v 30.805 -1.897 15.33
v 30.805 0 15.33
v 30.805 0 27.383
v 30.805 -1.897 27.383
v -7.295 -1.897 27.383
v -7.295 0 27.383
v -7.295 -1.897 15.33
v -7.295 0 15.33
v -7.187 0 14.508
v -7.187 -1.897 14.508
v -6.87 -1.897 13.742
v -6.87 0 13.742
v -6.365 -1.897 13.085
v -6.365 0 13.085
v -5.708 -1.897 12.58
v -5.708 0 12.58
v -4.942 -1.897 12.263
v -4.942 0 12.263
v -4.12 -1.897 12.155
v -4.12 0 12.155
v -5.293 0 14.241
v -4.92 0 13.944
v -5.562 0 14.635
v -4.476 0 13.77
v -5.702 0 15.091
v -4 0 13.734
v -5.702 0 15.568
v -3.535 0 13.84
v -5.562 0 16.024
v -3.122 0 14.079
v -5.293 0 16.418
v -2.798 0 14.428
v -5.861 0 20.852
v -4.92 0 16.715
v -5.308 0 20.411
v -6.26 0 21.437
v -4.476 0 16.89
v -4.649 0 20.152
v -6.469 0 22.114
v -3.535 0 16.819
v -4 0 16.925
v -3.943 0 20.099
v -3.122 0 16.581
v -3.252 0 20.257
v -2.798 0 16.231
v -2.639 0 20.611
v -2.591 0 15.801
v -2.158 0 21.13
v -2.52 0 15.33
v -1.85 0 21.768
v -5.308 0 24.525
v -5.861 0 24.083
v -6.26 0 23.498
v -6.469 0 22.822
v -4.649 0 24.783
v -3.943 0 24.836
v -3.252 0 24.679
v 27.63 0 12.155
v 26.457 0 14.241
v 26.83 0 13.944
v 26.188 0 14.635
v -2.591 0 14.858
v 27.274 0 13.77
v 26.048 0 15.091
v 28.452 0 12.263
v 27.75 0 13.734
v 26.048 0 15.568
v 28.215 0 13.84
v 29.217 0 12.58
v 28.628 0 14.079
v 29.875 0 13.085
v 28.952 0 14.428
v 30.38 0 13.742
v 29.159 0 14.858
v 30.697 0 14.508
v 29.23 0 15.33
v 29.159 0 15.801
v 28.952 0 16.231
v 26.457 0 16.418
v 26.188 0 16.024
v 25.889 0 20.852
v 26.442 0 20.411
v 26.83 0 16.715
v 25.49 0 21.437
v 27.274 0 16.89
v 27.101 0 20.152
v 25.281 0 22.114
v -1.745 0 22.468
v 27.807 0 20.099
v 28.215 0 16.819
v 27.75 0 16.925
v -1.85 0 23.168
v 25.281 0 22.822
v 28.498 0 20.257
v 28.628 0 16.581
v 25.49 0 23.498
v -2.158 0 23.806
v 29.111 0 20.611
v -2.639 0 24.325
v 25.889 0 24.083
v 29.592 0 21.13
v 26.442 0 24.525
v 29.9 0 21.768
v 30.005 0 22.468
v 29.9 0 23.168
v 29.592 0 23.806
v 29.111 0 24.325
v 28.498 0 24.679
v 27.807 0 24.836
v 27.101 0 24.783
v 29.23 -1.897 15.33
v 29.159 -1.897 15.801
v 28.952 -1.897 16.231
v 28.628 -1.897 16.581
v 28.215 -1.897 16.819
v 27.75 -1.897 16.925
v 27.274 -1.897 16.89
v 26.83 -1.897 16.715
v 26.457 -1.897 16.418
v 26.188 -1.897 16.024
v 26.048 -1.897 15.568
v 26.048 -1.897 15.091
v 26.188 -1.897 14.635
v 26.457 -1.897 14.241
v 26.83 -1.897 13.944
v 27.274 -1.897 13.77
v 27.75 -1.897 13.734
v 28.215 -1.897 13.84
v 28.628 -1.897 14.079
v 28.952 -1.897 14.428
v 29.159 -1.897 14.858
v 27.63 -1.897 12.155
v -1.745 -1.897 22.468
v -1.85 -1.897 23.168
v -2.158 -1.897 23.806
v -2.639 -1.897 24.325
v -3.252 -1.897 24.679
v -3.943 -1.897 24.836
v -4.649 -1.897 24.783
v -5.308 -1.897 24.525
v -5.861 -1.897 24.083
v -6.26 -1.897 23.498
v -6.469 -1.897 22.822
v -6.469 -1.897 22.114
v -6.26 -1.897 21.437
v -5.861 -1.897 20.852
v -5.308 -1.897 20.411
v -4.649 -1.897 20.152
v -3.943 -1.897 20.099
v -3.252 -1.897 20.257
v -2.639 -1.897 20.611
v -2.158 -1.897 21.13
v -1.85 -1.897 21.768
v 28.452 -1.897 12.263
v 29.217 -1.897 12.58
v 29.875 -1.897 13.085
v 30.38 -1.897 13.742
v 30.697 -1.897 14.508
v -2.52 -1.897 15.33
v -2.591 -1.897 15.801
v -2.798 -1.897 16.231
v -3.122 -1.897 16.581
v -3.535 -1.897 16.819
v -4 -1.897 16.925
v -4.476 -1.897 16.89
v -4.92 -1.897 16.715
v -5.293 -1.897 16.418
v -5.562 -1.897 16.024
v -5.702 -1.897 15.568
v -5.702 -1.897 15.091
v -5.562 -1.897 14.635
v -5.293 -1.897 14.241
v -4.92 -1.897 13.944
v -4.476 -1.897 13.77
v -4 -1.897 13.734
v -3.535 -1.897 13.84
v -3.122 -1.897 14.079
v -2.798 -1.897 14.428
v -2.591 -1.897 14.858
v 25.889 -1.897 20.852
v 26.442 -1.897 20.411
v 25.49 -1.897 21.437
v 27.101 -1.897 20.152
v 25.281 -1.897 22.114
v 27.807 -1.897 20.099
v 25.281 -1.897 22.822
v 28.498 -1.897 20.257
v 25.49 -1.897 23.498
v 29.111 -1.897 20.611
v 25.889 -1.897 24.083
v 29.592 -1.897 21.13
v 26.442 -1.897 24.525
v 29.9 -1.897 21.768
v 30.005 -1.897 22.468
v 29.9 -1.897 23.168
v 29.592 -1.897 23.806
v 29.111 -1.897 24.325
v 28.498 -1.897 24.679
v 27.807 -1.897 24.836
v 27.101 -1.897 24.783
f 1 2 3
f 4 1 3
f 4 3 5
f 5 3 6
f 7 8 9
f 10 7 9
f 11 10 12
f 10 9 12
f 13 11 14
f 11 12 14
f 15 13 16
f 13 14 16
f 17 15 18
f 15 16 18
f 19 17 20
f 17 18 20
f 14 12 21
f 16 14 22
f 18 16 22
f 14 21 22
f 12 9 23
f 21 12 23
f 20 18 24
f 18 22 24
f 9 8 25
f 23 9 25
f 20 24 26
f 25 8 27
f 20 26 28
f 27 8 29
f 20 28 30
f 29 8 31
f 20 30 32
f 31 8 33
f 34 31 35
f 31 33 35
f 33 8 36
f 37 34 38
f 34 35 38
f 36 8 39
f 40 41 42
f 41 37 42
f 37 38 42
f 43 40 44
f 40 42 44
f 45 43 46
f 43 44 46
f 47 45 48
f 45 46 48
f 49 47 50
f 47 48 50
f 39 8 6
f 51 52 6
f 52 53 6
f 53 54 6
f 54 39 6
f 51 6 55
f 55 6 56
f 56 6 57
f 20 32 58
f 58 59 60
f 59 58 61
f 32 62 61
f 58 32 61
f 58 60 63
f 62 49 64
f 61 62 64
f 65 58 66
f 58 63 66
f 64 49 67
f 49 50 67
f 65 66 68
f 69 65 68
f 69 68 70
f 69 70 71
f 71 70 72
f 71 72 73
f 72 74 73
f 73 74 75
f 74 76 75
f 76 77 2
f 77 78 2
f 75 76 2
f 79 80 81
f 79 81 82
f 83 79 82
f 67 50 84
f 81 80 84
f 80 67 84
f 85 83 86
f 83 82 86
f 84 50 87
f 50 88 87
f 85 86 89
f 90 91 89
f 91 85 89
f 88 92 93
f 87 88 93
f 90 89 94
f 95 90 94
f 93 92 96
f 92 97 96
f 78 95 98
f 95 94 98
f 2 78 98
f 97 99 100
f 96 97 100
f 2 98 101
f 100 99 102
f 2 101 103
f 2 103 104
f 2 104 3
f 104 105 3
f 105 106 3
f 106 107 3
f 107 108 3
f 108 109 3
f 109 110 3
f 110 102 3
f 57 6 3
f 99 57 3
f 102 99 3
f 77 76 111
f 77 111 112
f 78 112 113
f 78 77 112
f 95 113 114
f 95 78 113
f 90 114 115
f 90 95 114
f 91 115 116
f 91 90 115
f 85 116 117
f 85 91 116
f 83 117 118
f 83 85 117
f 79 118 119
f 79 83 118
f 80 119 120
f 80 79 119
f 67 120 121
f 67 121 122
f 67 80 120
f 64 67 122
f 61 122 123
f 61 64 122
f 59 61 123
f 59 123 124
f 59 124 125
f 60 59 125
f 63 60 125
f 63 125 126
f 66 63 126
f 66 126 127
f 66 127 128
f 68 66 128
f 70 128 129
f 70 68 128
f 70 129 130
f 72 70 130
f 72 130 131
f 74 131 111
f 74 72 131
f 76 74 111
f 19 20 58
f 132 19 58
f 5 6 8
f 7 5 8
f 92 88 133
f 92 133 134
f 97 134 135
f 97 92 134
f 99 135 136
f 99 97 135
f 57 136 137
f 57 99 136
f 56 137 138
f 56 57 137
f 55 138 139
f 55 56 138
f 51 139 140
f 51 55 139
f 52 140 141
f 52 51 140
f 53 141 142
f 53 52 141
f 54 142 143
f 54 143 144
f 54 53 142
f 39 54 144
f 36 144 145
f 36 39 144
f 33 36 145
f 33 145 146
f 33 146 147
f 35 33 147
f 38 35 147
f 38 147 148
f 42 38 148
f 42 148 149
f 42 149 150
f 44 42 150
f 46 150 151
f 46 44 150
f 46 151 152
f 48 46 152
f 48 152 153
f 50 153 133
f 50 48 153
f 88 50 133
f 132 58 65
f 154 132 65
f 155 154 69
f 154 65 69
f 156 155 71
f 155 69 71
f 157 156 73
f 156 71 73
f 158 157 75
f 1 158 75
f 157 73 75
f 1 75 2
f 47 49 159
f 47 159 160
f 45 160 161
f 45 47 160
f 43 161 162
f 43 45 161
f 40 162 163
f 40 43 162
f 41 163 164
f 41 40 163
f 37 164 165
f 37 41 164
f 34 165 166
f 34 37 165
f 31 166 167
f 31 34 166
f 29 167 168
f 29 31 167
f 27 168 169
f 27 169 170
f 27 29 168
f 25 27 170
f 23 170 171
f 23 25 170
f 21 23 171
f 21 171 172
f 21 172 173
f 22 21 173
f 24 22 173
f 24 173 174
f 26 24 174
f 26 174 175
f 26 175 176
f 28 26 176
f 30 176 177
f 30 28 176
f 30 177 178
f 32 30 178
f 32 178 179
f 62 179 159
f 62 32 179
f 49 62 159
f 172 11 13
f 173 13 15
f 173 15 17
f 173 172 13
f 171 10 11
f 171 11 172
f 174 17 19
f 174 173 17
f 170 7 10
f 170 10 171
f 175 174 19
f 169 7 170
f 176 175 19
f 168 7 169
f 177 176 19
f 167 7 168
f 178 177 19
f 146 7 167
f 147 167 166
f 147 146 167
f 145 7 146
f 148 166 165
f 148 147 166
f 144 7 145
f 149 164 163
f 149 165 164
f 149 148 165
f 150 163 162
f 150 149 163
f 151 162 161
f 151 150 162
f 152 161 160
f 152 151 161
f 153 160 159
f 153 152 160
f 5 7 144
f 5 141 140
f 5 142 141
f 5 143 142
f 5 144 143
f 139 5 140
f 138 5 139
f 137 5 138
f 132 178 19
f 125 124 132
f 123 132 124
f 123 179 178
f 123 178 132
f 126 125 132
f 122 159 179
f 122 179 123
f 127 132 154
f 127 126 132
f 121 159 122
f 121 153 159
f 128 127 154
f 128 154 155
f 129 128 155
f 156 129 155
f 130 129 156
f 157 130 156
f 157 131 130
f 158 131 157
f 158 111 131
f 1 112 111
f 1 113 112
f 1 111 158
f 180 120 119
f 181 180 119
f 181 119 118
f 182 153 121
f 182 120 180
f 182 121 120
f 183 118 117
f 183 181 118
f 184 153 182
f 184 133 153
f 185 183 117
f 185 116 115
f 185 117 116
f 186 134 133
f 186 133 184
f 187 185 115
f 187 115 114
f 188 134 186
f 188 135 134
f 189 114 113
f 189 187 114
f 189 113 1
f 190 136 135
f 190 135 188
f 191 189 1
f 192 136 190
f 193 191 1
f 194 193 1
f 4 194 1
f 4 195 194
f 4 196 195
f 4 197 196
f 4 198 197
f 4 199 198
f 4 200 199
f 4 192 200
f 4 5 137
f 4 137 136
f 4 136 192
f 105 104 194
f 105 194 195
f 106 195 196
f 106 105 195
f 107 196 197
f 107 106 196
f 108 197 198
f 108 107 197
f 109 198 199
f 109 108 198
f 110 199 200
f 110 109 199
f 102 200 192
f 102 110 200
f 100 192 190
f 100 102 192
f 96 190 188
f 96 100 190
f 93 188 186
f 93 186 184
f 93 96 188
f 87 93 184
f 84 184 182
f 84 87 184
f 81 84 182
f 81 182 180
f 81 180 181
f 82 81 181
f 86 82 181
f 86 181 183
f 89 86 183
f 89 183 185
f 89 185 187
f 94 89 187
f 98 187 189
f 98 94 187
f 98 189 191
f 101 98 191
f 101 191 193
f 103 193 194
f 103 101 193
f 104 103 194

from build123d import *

# Parameters (mm, degrees)
F0_R     = 1.6002
F0_R_2   = 2.375179
F1_DEPTH = 1.89738


with BuildPart() as f1:
    # F0 (on Front) → F1 (new body)
    with BuildSketch(Plane.XZ):
        with BuildLine():
            Line((30.804955, 27.38282), (-7.295045, 27.38282))
            Line((-7.295045, 27.38282), (-7.295045, 15.329635))
            ThreePointArc((-7.295045, 15.329635), (-6.365109, 13.084571), (-4.120045, 12.154635))
            Line((-4.120045, 12.154635), (0.667936, 12.154635))
            Line((0.667936, 12.154635), (22.841974, 12.154635))
            Line((22.841974, 12.154635), (27.629955, 12.154635))
            ThreePointArc((27.629955, 12.154635), (29.875019, 13.084571), (30.804955, 15.329635))
            Line((30.804955, 15.329635), (30.804955, 27.38282))
        make_face()
        with Locations((-4.120045, 15.329635)):
            Circle(F0_R, mode=Mode.SUBTRACT)
        with Locations((27.629955, 15.329635)):
            Circle(F0_R, mode=Mode.SUBTRACT)
        with Locations((-4.120045, 22.467641)):
            Circle(F0_R_2, mode=Mode.SUBTRACT)
        with Locations((27.629955, 22.467641)):
            Circle(F0_R_2, mode=Mode.SUBTRACT)
    extrude(amount=F1_DEPTH)


solid = f1.part
